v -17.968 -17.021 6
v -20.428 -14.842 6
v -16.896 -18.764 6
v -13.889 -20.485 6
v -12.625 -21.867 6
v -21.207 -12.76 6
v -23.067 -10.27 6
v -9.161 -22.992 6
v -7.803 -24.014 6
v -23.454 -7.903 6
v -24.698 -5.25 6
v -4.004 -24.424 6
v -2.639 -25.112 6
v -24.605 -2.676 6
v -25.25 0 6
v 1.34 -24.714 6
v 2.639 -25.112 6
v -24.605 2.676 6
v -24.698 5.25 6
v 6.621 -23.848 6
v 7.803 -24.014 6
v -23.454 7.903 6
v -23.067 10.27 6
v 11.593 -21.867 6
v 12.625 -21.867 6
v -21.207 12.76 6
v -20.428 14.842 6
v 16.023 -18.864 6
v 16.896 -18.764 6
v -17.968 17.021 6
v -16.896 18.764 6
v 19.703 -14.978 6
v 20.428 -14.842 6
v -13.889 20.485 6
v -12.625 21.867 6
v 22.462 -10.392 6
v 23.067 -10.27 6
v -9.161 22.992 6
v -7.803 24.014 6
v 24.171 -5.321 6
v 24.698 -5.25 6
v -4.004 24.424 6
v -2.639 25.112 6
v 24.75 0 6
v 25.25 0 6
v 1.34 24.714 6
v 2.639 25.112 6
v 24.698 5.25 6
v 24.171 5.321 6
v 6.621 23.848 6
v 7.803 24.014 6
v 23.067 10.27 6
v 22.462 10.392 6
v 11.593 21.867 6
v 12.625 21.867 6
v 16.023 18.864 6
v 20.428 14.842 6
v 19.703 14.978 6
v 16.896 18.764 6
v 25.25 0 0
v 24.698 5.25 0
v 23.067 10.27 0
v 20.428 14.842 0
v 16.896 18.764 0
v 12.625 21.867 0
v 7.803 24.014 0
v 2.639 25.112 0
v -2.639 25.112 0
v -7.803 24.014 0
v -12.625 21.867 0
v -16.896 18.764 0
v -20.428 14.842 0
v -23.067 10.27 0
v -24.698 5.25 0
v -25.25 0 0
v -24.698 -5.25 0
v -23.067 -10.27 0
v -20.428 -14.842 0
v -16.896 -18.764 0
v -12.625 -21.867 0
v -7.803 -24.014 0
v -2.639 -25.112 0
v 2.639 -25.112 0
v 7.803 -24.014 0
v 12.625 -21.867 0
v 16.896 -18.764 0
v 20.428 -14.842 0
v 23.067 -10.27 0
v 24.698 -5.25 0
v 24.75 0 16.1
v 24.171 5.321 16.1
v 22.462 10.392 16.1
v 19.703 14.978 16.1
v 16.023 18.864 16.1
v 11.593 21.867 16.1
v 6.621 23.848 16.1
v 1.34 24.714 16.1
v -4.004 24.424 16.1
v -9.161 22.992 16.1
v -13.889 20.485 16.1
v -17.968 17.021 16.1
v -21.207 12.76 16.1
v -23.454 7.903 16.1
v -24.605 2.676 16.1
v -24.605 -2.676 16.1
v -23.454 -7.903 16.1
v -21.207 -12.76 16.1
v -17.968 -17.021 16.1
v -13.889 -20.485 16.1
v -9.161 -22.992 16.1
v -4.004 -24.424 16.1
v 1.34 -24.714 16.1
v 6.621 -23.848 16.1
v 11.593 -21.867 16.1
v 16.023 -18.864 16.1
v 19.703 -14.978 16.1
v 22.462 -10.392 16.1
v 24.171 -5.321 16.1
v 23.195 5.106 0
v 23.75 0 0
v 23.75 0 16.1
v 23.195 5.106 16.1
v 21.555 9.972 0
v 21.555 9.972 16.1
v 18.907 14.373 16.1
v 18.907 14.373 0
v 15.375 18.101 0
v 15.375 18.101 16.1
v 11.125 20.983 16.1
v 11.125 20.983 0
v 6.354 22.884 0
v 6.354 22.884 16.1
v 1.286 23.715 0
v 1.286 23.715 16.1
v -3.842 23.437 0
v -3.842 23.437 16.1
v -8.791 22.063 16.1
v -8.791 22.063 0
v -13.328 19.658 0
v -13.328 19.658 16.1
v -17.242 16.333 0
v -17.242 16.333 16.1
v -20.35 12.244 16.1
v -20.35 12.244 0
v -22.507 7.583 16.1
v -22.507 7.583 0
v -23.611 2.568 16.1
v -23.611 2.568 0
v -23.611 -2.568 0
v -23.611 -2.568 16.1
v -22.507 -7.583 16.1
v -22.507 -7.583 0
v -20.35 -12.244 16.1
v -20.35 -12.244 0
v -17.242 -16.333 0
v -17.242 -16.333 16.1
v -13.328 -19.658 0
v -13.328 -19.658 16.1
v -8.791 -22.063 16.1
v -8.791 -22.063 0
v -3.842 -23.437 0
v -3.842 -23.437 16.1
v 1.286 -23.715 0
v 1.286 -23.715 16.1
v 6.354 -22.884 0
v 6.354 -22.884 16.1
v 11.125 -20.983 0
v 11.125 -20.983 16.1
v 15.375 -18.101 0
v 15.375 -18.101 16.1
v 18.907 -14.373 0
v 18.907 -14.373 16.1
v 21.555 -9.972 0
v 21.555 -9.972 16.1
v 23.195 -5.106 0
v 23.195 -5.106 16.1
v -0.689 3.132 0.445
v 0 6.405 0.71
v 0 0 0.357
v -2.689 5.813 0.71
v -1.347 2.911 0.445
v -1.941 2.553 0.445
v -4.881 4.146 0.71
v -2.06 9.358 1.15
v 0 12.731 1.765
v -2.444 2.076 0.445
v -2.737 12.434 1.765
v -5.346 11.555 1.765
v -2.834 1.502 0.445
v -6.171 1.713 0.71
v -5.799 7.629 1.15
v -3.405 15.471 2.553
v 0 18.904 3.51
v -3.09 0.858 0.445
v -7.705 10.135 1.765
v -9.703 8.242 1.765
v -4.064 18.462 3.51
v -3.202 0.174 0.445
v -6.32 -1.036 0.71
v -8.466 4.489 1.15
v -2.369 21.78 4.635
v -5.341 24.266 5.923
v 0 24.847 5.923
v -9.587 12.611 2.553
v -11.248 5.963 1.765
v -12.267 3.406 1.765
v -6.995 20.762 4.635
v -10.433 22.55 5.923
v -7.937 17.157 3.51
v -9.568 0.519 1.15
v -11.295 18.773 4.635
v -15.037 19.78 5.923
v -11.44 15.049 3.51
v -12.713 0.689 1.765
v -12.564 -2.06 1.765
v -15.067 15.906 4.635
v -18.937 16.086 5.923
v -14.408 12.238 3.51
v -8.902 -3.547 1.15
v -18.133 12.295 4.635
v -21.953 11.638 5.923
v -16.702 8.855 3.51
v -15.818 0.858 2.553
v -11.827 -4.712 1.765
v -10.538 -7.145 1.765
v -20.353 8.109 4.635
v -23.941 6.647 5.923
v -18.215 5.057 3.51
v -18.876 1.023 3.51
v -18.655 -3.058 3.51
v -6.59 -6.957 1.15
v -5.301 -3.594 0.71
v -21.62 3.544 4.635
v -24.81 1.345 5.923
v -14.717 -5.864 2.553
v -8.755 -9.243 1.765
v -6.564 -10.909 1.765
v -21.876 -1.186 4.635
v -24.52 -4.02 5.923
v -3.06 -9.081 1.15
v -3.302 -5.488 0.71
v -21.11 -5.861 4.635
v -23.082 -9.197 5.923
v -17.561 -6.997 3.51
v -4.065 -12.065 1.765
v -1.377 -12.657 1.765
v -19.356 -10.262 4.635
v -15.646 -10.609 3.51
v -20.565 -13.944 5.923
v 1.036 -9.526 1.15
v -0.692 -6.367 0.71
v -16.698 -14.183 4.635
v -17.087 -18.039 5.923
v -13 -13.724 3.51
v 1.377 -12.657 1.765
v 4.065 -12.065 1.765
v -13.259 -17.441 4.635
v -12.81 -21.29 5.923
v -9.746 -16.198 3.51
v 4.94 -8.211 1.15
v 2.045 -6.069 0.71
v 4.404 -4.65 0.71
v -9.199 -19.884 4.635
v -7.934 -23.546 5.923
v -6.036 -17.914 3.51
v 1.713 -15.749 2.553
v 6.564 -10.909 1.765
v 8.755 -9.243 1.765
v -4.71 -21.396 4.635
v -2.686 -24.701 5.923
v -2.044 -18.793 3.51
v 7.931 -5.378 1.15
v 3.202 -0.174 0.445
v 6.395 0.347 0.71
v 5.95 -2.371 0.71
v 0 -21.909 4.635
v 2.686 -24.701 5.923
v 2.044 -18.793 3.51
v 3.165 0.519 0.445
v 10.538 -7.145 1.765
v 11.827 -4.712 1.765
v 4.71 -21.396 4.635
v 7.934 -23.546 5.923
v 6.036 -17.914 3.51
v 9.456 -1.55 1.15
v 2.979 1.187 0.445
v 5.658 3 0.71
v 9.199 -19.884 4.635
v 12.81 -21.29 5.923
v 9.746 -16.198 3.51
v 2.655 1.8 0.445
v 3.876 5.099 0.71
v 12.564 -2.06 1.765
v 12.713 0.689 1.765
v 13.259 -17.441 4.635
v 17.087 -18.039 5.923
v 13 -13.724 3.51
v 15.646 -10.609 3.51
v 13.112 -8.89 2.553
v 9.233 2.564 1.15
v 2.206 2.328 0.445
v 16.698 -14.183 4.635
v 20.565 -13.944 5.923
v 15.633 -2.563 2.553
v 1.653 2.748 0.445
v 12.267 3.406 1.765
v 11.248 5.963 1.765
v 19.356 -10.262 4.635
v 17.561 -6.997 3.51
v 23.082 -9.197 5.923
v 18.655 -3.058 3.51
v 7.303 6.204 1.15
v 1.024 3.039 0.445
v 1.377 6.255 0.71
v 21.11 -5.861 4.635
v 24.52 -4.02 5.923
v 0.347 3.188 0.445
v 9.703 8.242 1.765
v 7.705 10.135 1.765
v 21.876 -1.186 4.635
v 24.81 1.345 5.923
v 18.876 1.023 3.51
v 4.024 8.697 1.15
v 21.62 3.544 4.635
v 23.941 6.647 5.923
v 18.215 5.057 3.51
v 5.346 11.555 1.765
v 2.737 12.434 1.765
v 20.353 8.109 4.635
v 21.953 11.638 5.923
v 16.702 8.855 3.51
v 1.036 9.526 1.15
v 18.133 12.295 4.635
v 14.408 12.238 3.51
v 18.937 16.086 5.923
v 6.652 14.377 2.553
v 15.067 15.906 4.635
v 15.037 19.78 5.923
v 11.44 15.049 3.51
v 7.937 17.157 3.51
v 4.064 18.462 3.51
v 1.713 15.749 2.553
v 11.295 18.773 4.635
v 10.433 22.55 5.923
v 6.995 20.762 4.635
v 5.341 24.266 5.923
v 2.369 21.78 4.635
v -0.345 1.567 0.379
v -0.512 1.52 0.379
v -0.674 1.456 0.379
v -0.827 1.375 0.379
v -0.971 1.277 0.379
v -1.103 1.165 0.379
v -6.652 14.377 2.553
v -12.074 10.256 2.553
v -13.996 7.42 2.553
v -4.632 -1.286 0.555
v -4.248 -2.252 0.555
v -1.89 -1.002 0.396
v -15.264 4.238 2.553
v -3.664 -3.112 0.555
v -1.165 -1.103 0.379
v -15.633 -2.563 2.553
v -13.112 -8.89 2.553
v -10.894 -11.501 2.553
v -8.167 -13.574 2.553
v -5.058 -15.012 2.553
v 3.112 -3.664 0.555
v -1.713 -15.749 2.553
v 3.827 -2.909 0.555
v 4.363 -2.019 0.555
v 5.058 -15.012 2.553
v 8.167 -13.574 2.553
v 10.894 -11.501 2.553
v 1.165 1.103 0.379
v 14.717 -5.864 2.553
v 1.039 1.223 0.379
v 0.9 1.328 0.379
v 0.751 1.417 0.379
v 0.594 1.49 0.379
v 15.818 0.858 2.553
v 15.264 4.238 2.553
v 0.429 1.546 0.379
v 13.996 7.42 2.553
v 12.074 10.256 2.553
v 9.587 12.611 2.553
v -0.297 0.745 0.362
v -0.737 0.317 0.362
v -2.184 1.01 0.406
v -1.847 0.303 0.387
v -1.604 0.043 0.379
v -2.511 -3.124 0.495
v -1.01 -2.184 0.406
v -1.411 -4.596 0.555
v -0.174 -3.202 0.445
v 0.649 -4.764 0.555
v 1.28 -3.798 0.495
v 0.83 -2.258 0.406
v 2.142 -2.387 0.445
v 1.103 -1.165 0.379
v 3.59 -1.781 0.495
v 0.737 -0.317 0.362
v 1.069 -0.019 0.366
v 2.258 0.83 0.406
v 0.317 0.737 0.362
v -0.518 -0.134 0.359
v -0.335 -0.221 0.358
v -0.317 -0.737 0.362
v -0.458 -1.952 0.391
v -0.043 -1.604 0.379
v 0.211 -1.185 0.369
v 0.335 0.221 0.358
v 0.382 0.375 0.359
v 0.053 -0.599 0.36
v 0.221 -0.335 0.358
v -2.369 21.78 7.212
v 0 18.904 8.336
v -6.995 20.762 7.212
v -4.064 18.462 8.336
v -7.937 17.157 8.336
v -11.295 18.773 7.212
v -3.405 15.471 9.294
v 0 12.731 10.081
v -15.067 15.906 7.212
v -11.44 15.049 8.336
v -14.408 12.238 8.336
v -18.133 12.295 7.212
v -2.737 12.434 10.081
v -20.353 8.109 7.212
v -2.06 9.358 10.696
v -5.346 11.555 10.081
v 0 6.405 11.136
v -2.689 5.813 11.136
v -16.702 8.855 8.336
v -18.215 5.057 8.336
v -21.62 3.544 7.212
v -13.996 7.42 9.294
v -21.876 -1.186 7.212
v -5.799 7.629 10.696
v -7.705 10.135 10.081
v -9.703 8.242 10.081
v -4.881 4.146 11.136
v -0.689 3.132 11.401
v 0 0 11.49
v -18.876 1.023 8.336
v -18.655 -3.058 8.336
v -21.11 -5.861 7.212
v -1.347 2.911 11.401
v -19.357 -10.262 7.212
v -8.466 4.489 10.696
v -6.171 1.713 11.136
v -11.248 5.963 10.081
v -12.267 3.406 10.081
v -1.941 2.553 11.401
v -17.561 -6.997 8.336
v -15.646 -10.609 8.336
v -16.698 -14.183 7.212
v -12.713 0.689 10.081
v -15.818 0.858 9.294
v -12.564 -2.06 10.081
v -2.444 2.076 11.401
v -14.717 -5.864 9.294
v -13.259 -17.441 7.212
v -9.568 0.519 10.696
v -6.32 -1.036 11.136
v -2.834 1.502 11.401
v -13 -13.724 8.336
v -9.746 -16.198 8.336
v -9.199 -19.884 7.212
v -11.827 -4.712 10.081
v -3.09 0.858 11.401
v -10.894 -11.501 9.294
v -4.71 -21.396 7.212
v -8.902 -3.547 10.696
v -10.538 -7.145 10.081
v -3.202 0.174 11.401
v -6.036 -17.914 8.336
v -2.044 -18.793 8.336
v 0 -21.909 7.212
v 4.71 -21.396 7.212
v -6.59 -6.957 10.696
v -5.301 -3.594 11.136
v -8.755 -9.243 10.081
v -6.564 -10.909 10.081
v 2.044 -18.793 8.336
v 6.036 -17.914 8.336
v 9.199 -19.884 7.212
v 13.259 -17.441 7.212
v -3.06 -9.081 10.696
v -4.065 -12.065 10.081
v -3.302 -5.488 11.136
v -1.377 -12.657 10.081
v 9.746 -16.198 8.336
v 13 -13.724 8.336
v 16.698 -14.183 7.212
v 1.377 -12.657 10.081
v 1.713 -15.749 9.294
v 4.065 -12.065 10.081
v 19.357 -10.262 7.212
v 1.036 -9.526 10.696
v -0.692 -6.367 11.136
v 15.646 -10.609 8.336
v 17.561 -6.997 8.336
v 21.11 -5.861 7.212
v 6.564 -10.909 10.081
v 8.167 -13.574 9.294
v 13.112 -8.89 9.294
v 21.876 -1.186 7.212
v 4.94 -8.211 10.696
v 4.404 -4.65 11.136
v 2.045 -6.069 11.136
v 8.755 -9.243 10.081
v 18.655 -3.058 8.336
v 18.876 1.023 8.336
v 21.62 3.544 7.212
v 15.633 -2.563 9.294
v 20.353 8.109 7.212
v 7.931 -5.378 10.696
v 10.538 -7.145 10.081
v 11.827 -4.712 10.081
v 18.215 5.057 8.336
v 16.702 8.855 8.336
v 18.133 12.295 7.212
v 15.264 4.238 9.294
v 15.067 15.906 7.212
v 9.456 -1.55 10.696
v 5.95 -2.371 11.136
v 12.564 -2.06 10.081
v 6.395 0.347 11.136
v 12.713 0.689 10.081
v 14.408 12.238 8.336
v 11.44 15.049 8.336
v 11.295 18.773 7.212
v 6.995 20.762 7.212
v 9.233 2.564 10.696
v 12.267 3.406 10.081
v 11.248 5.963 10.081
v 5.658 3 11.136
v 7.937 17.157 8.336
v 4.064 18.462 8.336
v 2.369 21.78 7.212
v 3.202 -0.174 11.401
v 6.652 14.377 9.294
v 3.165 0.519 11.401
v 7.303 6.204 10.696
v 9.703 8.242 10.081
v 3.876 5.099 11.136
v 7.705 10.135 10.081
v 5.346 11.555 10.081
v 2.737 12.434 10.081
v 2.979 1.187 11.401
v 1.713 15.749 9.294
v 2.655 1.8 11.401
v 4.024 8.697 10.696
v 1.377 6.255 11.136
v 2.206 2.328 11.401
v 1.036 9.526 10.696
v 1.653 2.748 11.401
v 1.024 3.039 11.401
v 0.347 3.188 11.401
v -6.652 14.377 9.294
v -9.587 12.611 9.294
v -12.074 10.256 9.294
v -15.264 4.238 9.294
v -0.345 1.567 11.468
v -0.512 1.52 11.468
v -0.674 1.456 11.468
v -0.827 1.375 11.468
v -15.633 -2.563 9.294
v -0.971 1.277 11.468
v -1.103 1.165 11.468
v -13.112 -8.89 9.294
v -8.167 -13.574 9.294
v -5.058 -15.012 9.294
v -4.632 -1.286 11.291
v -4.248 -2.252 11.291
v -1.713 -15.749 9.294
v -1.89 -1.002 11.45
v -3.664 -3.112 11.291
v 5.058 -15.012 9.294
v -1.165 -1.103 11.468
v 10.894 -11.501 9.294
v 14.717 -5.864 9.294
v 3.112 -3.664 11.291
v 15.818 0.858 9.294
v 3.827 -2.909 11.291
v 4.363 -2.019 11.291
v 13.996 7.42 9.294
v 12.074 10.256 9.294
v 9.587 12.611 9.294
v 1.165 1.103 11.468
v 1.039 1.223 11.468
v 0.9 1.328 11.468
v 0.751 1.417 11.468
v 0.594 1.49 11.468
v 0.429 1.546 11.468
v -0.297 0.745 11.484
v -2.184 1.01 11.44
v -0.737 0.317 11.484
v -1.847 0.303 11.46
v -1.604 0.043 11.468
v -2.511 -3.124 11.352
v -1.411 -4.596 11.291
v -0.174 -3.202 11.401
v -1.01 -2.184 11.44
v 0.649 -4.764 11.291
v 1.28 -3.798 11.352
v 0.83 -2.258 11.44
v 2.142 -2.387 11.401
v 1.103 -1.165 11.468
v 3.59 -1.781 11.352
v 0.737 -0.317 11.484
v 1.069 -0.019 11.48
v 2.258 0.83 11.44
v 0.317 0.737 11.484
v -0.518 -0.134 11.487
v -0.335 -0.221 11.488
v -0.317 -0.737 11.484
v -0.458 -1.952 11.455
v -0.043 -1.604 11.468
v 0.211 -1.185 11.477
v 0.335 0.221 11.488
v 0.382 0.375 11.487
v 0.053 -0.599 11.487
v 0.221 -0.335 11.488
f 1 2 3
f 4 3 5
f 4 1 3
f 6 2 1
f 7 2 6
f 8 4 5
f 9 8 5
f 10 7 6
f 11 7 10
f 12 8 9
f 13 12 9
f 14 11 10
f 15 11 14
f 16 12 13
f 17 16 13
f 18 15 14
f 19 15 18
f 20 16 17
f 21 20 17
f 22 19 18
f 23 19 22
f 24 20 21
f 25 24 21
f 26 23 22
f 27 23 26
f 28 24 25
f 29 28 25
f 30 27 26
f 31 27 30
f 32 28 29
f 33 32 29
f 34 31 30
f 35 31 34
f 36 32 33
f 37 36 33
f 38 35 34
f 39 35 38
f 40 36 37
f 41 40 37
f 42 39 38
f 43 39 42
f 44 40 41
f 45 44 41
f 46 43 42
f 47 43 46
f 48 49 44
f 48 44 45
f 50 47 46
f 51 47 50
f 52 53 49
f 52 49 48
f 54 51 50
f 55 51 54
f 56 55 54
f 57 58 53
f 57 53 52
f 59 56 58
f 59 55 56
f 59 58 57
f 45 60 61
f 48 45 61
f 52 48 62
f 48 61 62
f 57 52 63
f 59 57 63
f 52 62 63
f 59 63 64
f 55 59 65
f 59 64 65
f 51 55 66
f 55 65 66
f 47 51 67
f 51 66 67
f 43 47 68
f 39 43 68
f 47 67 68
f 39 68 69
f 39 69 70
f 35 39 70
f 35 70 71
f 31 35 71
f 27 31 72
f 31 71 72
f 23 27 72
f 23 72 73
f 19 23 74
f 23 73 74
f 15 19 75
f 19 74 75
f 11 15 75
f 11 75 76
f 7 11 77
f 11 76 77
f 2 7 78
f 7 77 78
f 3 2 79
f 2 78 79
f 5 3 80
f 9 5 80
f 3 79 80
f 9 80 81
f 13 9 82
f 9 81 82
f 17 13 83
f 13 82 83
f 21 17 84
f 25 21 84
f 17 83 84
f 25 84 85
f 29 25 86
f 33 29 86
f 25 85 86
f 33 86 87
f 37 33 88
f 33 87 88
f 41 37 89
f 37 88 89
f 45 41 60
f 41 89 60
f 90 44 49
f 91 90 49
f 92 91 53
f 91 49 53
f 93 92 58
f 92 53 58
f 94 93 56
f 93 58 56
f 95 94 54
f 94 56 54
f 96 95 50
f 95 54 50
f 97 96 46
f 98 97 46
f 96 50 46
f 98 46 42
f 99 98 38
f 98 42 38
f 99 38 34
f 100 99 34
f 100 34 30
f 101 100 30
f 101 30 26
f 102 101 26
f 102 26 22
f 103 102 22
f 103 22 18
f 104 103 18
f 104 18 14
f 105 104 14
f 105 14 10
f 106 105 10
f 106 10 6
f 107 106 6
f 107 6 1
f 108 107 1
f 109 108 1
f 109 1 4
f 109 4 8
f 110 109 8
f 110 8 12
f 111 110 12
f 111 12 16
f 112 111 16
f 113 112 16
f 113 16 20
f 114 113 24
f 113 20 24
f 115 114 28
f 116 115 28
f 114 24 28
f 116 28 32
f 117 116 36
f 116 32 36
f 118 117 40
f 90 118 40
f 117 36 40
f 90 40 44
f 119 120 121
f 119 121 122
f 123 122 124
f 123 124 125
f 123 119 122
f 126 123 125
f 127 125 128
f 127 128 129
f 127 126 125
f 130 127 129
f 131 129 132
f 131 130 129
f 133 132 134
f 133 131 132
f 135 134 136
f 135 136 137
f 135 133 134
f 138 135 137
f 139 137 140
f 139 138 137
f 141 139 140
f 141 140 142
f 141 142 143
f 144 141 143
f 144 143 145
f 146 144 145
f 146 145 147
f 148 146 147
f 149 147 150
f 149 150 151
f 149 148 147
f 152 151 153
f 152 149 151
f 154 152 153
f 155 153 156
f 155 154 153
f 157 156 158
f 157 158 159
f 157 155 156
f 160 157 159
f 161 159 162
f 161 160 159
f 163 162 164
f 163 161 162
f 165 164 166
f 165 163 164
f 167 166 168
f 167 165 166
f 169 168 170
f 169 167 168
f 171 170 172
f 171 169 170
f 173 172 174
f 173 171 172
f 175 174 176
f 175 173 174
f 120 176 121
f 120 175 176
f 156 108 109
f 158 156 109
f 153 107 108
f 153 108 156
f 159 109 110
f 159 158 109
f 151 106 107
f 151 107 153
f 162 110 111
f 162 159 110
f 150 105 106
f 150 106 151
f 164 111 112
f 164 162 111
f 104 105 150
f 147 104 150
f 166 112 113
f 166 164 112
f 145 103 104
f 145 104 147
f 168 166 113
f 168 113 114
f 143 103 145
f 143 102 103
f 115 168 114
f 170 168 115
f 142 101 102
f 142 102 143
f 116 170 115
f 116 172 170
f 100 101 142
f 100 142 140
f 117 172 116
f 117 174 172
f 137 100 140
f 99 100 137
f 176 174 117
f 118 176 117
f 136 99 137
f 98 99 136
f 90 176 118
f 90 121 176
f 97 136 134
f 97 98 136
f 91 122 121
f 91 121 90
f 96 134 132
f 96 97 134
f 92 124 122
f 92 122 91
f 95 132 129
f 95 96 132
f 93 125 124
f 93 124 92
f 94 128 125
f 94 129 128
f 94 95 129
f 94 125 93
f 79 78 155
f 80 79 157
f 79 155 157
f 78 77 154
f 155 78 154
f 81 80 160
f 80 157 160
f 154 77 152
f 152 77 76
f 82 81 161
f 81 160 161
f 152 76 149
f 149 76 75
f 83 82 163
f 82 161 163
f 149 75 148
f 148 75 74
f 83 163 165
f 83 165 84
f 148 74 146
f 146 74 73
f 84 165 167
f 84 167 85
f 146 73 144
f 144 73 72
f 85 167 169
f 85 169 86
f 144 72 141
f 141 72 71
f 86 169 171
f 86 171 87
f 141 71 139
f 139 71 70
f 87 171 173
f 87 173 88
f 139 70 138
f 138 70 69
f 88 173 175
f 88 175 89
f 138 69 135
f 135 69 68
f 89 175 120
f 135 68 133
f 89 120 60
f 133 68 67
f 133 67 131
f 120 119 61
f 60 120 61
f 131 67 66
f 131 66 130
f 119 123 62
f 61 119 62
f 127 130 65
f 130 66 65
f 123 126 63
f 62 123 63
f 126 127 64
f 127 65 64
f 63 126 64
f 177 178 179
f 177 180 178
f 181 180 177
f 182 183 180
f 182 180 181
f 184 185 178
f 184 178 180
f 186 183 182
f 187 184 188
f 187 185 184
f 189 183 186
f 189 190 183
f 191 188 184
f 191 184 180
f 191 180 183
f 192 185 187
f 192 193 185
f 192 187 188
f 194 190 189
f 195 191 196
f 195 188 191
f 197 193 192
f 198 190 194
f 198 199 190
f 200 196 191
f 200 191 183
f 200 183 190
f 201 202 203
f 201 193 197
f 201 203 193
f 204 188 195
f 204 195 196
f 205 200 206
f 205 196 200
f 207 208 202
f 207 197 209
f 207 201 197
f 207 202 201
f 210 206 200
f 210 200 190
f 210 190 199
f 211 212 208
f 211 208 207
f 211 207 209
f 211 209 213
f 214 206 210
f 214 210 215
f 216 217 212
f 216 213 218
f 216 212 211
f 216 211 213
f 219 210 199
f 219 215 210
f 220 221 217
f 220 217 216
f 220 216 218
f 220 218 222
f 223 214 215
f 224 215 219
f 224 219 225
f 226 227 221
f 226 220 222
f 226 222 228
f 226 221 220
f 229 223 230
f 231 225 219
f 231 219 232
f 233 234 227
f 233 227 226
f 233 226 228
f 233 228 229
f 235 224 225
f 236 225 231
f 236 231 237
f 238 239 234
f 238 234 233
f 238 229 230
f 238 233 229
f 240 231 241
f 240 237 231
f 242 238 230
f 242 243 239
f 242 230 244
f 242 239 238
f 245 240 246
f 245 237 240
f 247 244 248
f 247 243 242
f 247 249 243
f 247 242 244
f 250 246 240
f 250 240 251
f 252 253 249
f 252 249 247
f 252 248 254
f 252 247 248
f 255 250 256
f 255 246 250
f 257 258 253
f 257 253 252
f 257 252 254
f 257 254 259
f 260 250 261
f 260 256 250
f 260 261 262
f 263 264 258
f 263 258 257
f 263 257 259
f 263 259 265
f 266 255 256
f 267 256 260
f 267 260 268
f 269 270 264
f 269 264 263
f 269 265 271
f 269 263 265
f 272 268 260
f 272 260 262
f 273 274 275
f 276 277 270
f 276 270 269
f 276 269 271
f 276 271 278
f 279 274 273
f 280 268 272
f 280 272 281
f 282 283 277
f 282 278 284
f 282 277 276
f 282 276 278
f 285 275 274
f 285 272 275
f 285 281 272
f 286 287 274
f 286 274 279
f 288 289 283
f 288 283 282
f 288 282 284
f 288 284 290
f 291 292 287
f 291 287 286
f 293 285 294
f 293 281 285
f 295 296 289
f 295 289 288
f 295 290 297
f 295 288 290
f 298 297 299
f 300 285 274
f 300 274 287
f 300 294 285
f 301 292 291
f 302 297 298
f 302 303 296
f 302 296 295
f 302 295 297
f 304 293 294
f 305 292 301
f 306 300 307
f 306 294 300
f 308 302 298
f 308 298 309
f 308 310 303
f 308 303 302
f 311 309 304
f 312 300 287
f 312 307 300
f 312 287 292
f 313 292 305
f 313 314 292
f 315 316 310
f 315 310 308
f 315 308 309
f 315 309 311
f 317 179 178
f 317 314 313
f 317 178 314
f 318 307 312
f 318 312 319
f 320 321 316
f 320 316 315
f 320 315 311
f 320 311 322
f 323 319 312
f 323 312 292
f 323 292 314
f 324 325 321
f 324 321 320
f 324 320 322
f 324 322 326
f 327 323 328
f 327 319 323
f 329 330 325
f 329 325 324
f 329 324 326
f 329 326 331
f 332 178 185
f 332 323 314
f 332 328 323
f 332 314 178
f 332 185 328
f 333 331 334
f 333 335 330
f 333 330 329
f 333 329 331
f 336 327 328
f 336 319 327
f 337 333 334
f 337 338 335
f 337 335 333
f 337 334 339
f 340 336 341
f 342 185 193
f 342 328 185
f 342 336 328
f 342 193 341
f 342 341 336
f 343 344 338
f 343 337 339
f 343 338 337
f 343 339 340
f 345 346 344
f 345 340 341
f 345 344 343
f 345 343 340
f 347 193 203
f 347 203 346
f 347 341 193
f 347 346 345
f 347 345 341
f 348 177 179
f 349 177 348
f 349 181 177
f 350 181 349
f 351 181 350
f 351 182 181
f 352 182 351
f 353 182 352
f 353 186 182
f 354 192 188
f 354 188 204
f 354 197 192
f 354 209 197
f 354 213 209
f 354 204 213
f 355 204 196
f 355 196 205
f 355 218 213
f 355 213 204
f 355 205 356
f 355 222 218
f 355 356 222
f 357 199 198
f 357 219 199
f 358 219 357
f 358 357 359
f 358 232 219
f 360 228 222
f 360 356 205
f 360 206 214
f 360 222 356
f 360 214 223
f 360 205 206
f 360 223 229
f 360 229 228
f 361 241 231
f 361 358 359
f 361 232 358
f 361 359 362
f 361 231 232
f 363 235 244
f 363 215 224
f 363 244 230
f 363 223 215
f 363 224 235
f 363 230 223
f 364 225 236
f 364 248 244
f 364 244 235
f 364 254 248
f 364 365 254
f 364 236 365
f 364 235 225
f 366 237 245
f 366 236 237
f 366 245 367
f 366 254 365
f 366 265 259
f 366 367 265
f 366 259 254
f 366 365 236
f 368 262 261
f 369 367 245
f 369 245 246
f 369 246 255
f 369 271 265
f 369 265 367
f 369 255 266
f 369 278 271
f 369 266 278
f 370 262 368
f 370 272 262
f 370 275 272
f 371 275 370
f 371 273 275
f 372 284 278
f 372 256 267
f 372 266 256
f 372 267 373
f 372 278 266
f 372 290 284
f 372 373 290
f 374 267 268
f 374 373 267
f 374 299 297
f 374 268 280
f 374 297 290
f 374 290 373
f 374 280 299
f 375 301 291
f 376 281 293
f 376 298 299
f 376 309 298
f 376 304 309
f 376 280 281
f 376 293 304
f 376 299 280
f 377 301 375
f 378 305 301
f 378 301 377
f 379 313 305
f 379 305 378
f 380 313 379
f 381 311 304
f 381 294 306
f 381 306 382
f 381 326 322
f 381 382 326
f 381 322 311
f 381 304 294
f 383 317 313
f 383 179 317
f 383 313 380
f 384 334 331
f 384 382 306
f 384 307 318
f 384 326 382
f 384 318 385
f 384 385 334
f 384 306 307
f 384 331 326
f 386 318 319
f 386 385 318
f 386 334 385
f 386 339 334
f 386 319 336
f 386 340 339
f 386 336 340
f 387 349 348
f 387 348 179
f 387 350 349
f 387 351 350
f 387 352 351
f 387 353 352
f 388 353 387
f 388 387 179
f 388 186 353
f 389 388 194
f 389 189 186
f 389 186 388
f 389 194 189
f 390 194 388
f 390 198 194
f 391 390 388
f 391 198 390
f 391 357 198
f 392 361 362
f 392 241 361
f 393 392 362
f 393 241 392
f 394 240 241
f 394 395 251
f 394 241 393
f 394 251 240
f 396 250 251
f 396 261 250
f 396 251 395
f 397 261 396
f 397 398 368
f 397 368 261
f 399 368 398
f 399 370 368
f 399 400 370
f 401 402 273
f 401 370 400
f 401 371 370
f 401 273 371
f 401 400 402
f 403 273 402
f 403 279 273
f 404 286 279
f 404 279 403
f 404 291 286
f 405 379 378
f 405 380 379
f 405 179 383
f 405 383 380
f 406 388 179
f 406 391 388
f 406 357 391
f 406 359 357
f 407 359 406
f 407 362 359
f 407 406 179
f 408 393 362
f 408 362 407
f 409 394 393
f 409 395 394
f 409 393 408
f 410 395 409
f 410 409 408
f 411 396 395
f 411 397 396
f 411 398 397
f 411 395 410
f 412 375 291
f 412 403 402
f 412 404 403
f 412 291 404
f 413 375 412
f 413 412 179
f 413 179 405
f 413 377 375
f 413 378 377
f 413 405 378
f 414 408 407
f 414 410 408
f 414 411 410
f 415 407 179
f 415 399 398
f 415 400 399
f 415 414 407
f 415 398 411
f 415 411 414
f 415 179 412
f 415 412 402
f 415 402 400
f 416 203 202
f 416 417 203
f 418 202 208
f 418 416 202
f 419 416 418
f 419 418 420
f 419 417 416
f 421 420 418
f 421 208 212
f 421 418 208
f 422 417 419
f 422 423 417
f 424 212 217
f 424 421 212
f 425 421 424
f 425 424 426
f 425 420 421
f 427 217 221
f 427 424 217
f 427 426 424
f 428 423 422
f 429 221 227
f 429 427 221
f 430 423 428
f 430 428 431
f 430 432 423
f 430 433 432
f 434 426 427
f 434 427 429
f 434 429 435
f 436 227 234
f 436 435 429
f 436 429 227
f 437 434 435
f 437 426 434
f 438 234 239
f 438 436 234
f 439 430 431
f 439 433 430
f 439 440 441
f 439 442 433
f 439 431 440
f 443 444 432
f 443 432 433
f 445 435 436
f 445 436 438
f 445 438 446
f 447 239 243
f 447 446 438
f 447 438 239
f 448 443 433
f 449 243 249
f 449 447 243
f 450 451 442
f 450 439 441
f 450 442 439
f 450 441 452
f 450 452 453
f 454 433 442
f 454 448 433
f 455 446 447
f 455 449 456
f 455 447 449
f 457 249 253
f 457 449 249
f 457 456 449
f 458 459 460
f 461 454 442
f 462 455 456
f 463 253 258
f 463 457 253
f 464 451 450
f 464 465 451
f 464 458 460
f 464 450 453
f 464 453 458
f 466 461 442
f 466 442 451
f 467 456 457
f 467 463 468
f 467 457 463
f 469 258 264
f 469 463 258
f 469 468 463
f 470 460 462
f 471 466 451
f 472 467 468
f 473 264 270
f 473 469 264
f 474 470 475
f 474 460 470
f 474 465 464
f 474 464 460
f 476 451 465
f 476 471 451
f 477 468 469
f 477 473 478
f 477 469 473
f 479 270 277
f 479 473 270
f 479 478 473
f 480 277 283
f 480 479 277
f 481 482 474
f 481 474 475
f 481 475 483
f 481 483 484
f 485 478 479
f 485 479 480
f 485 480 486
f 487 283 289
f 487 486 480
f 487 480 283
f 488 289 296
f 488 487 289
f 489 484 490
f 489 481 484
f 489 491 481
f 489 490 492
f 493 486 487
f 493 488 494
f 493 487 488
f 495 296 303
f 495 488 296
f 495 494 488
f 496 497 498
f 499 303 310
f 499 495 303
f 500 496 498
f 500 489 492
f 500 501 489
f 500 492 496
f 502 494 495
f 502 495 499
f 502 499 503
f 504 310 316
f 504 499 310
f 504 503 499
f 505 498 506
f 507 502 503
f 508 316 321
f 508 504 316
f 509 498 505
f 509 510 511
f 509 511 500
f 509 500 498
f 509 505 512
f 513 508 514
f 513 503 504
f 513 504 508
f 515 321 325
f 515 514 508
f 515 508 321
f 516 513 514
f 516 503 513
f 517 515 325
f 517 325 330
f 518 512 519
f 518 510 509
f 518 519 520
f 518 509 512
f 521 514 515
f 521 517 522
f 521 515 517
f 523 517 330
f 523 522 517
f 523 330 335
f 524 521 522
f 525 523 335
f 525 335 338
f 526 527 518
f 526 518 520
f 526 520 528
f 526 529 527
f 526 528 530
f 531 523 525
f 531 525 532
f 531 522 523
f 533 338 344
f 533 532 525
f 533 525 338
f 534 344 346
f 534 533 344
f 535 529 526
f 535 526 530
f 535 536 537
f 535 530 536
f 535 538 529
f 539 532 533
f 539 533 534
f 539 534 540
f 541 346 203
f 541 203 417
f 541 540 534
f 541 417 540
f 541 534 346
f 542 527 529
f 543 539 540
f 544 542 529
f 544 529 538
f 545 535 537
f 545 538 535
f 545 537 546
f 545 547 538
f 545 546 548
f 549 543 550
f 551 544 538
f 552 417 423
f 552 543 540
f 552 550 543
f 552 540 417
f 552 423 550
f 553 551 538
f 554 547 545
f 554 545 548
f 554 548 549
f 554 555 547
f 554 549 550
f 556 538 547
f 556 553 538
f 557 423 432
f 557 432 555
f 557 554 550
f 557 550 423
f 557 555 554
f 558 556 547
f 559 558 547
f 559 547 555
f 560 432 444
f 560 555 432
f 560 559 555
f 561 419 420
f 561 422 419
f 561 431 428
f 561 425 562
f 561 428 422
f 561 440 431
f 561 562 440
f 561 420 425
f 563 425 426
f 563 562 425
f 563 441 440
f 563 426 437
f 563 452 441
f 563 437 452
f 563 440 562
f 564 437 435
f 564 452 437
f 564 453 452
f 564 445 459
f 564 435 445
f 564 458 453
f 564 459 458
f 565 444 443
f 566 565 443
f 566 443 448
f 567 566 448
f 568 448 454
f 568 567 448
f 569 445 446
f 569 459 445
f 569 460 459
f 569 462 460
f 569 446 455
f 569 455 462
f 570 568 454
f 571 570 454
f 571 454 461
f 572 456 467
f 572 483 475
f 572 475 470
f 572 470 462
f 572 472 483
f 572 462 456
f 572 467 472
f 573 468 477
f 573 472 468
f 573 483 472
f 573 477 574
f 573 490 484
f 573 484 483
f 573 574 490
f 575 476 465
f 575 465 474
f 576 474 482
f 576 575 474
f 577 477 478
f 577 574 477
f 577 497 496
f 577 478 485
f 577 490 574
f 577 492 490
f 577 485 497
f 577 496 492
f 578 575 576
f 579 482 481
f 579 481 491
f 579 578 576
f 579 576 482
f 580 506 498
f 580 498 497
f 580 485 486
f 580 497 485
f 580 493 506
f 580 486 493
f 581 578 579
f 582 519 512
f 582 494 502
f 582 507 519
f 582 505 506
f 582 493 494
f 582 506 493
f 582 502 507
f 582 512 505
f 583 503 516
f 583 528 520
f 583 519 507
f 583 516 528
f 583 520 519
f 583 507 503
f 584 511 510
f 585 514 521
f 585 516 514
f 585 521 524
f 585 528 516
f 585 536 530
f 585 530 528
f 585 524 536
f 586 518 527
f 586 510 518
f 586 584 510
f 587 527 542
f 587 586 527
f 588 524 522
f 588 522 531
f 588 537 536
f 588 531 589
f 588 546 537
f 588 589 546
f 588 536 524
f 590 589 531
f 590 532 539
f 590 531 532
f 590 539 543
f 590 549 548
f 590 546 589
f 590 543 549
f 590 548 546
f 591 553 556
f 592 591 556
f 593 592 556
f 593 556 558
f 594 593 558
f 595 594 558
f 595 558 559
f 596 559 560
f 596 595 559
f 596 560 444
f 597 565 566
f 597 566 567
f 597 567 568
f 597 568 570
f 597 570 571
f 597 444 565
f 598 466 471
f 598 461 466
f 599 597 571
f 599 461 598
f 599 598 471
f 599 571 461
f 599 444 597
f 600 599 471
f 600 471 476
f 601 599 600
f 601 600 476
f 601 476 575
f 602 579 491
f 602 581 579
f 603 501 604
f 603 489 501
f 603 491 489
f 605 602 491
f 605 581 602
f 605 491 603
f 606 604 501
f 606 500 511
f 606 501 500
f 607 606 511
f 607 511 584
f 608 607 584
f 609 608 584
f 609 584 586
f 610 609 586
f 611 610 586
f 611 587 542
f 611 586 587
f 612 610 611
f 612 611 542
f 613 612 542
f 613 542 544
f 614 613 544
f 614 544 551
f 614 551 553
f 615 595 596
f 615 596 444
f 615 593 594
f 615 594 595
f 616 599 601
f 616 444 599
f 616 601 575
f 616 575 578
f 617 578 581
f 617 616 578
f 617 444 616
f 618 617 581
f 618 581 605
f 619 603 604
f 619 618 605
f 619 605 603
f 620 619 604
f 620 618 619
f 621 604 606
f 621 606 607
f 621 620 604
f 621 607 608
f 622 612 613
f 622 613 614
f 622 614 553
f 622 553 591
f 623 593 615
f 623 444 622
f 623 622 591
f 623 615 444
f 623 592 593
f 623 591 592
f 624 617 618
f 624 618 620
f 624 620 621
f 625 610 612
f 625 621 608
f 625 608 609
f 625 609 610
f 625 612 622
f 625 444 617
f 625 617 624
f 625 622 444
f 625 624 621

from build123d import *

# Parameters (mm, degrees)
F0_R     = 24.75
F0_R_2   = 23.75
F1_DEPTH = 16.1
F0_R_3   = 25.25
F2_DEPTH = 6


with BuildPart() as f1:
    # F0 (on Top) → F1 (new body)
    with BuildSketch(Plane.XY):
        Circle(F0_R)
        Circle(F0_R_2, mode=Mode.SUBTRACT)
    extrude(amount=F1_DEPTH)

    # F0 (on Top) → F2 (join)
    with BuildSketch(Plane.XY):
        Circle(F0_R_3)
        Circle(F0_R, mode=Mode.SUBTRACT)
    extrude(amount=F2_DEPTH)


with BuildPart() as f4:
    # F3 (on Right) → F4 (revolve)
    with BuildSketch(Plane.YZ):
        with BuildLine():
            ThreePointArc((0, 0.356617), (12.731392, 1.765281), (24.846878, 5.923124))
            ThreePointArc((24.846878, 5.923124), (12.731397, 10.081004), (0, 11.489681))
            Line((0, 11.489681), (0, 0.356617))
        make_face()
    revolve(axis=Axis((0, 0, 16.618348), (0, 0, 1)))


solid = Compound([f1.part, f4.part])
